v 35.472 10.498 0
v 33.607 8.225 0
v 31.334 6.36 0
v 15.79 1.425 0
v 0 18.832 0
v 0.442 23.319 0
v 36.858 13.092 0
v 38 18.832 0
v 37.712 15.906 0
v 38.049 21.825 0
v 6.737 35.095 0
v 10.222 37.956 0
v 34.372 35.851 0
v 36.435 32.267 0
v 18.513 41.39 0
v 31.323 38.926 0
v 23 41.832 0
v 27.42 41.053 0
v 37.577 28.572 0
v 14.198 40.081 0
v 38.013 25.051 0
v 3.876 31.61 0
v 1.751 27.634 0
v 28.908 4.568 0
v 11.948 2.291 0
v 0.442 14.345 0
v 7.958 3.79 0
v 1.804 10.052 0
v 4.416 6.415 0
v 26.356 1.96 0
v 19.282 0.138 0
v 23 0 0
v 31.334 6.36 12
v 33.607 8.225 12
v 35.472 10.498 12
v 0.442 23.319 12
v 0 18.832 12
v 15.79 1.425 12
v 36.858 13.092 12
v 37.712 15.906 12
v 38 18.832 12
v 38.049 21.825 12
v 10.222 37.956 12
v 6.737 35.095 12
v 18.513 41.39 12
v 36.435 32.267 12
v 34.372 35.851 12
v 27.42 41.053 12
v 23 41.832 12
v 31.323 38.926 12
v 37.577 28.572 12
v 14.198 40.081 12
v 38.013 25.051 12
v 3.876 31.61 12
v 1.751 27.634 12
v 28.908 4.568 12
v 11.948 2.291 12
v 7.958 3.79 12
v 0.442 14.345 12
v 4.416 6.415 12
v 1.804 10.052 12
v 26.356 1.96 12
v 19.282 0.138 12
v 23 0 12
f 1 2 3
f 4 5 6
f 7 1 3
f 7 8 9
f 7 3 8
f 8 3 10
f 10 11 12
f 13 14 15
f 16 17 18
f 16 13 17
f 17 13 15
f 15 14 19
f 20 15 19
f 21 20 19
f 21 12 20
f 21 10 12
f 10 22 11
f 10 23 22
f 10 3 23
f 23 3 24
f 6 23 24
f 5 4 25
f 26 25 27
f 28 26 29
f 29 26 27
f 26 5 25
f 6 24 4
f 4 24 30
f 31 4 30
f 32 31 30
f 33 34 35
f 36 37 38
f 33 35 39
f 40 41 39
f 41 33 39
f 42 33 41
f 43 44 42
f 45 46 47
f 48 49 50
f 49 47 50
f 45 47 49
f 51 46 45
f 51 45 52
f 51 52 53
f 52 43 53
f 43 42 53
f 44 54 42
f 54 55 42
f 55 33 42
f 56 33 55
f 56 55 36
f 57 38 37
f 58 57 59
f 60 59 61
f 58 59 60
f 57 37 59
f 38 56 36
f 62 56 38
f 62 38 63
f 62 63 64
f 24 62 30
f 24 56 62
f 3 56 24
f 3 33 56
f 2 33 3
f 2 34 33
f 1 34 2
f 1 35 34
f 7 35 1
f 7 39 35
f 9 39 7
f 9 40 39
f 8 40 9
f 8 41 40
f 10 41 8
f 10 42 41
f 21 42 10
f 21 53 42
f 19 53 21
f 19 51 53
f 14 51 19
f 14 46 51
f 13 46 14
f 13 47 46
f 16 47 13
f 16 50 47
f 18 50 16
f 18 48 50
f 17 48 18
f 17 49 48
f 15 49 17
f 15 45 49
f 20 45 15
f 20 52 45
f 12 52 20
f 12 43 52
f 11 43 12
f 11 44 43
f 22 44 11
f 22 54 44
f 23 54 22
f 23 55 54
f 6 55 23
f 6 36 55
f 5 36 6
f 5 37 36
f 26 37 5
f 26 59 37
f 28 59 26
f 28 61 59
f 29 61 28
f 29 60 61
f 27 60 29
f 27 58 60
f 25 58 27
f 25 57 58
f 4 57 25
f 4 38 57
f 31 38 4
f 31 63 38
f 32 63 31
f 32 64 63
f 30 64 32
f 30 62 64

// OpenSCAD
$fn = 32;

// ----------------------------------------------------------------------
// Cam disc: base radius 15.0 mm, lift 8.0 mm, 32 profile points
// ----------------------------------------------------------------------

// --- parameters (mm) ---
profile_height = 12;      // extrusion height
profile_points = 32;      // points of the closed outline

profile = [[38, 18.832], [38.049, 21.825], [38.013, 25.051], [37.577, 28.572], [36.435, 32.267], [34.372, 35.851], [31.323, 38.926], [27.42, 41.053], [23, 41.832], [18.513, 41.39], [14.198, 40.081], [10.222, 37.956], [6.737, 35.095], [3.876, 31.61], [1.751, 27.634], [0.442, 23.319], [0, 18.832], [0.442, 14.345], [1.804, 10.052], [4.416, 6.415], [7.958, 3.79], [11.948, 2.291], [15.79, 1.425], [19.282, 0.138], [23, 0], [26.356, 1.96], [28.908, 4.568], [31.334, 6.36], [33.607, 8.225], [35.472, 10.498], [36.858, 13.092], [37.712, 15.906]];  // single closed polygon, 32 points, counter clockwise

// --- the one profile operation ---
linear_extrude(height = profile_height) polygon(points = profile);
